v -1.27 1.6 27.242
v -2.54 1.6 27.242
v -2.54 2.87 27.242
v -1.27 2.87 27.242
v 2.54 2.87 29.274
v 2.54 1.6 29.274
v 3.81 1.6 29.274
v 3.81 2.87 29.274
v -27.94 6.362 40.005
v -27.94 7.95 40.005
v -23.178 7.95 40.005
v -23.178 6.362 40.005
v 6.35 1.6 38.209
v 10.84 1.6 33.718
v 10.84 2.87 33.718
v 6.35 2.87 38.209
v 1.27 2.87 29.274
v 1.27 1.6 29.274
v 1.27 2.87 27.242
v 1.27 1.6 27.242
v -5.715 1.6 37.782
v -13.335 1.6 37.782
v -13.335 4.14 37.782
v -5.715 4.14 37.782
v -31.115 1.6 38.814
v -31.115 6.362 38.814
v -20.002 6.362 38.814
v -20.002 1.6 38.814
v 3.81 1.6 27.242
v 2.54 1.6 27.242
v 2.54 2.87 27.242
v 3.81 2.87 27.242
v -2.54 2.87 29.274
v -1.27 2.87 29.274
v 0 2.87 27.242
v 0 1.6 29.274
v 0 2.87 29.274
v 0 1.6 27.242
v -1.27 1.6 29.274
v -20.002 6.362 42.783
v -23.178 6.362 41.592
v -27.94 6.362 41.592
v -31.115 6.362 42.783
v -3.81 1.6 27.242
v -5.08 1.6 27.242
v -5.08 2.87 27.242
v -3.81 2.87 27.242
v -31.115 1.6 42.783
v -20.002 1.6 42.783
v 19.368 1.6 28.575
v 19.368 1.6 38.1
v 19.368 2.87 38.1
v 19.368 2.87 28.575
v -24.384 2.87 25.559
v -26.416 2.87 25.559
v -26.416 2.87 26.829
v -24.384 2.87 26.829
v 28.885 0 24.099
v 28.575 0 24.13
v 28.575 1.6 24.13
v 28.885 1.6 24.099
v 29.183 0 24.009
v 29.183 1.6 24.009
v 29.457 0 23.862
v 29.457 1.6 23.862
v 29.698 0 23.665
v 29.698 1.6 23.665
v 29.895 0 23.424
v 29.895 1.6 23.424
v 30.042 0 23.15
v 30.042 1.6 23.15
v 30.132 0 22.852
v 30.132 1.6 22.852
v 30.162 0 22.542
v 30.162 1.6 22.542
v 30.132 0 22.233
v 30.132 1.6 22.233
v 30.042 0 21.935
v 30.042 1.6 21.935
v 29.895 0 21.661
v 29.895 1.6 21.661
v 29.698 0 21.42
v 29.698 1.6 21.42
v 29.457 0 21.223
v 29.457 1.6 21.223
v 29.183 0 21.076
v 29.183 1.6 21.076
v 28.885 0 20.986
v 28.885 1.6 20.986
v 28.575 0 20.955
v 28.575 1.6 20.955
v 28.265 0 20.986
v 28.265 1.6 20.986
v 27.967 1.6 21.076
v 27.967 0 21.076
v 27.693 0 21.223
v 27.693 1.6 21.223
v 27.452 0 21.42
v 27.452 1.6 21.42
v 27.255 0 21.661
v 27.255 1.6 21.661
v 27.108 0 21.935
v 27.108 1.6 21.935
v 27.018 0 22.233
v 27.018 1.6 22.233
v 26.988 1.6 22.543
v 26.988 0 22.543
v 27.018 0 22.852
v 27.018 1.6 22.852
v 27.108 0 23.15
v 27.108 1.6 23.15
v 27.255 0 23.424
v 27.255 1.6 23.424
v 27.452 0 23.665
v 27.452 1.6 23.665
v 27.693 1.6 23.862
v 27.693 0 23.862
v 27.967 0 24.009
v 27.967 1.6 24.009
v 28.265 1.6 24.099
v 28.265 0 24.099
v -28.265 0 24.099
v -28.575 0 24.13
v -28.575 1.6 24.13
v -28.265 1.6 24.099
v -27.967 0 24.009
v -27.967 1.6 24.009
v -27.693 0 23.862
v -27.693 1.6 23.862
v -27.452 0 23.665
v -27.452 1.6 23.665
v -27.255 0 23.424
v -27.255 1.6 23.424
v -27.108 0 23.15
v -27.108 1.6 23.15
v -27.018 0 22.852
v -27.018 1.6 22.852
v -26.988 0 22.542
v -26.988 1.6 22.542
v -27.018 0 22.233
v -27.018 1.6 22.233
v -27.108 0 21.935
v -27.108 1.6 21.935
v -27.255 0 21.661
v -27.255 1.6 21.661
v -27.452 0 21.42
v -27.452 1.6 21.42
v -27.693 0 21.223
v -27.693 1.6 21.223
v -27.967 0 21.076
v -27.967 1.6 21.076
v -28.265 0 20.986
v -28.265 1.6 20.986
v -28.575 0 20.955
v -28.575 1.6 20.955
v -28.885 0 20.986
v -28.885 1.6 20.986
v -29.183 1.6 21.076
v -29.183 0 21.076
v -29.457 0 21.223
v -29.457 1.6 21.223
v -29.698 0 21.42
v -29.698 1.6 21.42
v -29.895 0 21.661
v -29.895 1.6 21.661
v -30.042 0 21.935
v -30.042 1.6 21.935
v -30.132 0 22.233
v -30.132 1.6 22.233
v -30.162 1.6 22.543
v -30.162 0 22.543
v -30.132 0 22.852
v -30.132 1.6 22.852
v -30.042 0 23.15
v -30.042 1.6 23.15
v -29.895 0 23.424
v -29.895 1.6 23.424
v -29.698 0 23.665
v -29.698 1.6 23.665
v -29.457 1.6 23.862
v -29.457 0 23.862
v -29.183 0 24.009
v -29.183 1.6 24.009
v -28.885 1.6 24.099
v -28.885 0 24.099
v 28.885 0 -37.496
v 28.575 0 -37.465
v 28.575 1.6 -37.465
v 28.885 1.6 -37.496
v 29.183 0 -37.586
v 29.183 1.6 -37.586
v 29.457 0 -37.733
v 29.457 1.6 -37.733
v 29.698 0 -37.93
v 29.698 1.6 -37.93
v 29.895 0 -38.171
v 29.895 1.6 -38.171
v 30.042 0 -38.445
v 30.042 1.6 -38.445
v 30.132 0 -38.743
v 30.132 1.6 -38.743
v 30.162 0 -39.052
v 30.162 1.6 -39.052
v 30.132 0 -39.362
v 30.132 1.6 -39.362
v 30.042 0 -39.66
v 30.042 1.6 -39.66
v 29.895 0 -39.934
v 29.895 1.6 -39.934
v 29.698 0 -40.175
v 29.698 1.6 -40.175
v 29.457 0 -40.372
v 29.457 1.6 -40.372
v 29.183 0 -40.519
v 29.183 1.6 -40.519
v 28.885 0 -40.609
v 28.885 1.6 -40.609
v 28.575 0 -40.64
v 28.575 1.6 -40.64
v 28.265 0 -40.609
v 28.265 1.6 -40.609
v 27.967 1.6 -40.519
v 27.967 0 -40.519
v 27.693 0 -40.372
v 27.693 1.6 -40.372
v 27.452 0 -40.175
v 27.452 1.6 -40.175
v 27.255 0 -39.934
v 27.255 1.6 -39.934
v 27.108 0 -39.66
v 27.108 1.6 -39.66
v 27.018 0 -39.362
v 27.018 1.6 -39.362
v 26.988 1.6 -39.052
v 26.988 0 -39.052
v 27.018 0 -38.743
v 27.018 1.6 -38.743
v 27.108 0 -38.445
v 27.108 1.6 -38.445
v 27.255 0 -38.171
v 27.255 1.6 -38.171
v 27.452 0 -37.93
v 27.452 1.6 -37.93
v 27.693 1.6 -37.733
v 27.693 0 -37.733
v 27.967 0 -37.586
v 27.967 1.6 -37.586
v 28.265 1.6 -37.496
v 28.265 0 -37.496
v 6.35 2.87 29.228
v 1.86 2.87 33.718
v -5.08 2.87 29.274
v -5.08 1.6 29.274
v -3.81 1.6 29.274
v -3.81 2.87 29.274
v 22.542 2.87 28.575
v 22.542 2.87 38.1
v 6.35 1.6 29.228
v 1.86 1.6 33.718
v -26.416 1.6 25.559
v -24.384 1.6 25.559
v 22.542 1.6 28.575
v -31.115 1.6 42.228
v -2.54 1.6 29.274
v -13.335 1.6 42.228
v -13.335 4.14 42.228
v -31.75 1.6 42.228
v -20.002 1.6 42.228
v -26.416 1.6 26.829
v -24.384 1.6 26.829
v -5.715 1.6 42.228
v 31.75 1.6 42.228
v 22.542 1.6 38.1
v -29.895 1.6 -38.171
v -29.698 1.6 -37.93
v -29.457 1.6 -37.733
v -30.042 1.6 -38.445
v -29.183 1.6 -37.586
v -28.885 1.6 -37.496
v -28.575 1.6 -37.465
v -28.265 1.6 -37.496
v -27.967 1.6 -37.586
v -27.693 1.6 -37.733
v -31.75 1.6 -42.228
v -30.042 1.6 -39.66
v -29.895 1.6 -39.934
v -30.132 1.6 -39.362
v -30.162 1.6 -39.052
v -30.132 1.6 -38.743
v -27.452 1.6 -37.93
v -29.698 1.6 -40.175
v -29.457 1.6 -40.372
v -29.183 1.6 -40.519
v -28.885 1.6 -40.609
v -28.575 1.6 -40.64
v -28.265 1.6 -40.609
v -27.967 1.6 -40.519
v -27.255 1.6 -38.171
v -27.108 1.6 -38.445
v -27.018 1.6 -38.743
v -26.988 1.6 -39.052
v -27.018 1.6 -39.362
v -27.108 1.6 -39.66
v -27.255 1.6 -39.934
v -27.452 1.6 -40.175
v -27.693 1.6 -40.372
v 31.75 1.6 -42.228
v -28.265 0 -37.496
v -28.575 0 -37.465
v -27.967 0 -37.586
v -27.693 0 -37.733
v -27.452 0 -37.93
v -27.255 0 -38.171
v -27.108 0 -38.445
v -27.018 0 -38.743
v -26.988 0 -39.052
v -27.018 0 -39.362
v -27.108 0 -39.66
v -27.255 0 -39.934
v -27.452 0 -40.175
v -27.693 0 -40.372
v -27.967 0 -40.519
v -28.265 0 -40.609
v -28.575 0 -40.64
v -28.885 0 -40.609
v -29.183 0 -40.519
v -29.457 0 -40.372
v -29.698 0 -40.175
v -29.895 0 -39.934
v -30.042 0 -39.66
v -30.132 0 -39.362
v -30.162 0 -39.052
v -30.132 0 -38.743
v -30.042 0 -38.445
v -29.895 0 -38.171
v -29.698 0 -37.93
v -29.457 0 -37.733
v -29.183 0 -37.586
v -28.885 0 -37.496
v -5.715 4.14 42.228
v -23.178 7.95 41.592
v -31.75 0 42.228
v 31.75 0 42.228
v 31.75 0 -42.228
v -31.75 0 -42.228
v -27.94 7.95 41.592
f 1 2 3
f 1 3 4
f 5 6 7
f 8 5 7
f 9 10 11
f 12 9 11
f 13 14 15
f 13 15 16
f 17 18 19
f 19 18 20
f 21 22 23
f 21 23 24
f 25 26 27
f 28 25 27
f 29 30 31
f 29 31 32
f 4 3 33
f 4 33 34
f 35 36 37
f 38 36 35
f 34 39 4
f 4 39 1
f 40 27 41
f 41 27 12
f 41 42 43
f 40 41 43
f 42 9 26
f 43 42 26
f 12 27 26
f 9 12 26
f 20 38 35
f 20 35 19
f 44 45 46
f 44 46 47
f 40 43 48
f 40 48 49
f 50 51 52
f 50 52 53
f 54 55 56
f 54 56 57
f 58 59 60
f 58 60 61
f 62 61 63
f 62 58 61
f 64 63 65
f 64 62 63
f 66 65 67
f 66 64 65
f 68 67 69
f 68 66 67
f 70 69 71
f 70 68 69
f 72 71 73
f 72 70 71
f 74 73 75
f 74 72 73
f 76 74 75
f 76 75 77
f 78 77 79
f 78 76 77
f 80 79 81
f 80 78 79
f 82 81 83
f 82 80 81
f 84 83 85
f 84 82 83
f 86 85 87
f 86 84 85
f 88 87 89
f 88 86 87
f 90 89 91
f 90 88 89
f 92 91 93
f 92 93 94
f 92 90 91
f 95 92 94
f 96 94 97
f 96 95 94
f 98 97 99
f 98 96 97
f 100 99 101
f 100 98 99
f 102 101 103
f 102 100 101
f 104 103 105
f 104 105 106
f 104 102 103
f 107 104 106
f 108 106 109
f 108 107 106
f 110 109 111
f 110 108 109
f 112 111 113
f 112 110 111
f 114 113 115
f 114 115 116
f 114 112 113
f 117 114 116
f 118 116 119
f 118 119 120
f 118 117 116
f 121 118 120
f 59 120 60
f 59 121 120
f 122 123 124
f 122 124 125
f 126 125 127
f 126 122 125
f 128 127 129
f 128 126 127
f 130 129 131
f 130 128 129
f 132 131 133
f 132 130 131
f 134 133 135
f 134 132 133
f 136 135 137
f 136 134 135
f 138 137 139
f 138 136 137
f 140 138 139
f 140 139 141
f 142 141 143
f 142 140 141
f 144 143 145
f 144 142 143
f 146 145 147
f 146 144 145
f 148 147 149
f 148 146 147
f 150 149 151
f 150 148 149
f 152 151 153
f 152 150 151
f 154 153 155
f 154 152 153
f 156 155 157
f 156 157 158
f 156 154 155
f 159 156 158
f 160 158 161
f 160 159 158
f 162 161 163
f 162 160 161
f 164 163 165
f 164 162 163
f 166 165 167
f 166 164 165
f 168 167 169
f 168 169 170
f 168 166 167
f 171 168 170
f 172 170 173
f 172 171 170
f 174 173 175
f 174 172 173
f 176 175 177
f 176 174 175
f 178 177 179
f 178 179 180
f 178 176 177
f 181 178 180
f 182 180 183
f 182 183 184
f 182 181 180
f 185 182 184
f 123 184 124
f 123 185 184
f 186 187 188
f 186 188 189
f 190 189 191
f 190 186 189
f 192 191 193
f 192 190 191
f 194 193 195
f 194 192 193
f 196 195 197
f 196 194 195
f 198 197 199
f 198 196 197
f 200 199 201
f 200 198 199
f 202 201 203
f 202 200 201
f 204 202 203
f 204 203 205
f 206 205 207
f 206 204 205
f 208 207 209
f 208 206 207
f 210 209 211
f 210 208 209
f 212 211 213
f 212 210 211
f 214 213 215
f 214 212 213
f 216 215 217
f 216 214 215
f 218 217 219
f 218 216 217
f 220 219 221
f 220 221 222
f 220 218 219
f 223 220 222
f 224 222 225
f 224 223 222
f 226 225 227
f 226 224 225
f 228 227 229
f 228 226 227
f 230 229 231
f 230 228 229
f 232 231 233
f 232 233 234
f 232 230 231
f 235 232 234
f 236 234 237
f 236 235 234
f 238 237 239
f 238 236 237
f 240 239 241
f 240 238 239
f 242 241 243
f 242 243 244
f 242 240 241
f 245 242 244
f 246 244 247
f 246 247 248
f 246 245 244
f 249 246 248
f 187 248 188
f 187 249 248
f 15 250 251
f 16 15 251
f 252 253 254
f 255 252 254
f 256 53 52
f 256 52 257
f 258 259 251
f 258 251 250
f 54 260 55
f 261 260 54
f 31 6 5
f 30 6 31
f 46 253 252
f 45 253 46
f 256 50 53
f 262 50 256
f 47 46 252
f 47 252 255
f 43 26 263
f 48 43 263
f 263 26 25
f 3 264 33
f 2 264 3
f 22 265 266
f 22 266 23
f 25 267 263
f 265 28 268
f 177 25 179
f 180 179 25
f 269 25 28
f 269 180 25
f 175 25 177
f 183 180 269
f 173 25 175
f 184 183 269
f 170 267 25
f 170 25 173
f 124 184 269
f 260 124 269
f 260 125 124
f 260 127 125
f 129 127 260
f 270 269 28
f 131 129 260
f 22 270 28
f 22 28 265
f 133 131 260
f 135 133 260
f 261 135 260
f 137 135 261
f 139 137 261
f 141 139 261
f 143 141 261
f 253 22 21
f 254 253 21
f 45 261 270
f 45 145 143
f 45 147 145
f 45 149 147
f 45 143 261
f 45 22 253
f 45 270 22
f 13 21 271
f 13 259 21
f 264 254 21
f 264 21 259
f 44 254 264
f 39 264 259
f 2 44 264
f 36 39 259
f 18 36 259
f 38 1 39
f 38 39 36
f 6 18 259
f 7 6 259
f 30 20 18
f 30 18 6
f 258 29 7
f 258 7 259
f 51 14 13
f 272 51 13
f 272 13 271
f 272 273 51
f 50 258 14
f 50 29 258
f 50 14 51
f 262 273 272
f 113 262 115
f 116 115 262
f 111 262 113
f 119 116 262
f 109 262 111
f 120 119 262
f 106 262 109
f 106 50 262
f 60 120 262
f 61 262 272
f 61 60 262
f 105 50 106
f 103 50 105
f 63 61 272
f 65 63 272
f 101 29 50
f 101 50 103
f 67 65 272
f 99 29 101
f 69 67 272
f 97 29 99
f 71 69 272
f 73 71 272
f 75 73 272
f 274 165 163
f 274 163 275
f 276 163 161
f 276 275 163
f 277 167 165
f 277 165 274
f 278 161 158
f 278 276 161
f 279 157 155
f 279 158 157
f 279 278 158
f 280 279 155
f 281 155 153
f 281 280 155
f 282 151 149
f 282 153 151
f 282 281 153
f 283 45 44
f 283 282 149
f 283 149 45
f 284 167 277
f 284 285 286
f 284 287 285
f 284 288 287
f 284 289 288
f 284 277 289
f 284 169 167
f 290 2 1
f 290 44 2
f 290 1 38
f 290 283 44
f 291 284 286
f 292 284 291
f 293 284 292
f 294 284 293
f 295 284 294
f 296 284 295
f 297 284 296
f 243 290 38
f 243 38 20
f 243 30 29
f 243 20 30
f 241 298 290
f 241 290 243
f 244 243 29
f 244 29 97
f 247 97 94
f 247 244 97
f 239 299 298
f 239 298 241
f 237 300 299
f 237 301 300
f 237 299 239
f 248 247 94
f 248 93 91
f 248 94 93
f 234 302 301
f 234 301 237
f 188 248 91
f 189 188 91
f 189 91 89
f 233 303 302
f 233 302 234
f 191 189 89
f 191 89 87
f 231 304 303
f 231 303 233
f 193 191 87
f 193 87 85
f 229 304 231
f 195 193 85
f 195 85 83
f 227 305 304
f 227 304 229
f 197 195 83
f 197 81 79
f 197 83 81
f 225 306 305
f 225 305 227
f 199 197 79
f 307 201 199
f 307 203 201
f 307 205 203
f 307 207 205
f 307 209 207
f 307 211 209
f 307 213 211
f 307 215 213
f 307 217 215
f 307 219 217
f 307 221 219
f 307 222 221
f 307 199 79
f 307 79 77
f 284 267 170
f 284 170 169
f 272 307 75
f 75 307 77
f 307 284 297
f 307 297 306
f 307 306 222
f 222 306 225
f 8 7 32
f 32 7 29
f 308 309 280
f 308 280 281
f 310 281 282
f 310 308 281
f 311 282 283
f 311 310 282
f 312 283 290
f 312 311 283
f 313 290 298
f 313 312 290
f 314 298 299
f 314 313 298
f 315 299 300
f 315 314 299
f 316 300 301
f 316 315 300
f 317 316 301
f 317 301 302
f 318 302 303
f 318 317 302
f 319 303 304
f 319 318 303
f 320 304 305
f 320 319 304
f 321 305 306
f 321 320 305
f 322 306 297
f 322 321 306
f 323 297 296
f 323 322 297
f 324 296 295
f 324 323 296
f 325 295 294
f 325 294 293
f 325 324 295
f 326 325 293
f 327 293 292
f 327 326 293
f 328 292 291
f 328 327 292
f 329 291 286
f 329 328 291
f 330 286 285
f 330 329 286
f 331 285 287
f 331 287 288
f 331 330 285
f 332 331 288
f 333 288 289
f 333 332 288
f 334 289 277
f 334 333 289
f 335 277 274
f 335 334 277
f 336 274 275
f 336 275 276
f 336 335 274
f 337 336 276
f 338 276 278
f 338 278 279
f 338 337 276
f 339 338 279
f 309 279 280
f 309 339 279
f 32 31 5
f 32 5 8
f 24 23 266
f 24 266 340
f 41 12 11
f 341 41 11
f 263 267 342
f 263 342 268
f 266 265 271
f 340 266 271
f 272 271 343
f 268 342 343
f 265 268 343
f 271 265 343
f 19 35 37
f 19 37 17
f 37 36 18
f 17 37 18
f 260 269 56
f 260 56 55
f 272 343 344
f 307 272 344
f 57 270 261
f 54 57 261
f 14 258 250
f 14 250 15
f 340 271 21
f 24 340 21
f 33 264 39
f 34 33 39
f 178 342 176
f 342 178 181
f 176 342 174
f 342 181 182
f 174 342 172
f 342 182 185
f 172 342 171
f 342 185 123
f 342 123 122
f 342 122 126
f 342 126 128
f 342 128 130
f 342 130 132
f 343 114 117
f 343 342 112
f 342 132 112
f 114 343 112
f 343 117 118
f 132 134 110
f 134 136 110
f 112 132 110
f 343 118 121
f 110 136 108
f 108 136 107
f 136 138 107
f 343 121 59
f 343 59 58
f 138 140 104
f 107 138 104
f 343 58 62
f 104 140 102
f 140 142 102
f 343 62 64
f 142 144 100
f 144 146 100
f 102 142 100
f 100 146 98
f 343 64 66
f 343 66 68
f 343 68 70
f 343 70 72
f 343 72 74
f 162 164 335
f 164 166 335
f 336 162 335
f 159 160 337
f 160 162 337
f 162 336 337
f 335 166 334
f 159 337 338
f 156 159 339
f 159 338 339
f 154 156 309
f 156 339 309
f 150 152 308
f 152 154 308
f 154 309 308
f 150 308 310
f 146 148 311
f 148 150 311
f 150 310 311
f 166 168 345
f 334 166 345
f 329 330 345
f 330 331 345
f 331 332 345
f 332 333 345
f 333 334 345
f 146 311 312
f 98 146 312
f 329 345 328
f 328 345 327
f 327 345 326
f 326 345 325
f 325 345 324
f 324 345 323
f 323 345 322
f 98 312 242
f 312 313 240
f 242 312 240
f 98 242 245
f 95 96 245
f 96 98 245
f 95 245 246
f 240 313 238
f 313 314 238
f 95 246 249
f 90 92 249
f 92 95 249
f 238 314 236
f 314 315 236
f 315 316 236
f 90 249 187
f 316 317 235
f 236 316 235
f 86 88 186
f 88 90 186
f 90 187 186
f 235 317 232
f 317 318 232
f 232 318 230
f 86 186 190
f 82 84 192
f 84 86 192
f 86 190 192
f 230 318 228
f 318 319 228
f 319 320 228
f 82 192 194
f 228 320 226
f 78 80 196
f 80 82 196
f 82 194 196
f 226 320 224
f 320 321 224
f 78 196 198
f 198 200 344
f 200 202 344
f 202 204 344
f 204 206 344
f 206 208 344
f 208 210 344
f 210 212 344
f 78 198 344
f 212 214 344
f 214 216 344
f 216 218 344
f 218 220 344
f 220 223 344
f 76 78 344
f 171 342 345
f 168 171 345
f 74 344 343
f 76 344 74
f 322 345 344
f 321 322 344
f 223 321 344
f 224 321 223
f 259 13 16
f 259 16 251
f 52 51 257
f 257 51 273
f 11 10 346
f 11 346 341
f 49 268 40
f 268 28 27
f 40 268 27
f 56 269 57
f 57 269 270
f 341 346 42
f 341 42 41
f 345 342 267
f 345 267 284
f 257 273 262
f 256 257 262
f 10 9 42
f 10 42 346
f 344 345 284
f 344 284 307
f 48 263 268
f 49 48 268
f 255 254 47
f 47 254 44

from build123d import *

# Parameters (mm, degrees)
SKETCH1_W                = 63.5
SKETCH1_H                = 84.455
SKETCH1_R                = 1.5875
BOSS_EXTRUDE1_DEPTH      = 1.6
SKETCH2_W                = 1.27
SKETCH2_H                = 2.032
SKETCH2_W_2              = 3.175
SKETCH2_H_2              = 9.525
SKETCH2_W_3              = 2.032
SKETCH2_H_3              = 1.27
BOSS_EXTRUDE2_DEPTH      = 1.27
SKETCH3_W                = 7.62
SKETCH3_H                = 4.445
BOSS_EXTRUDE3_DEPTH      = 2.54
BOSS_EXTRUDE4_DEPTH      = 1.984375
BOSS_EXTRUDE4_DEPTH_BACK = 1.984375
BOSS_EXTRUDE4_START      = -1.42875
CUT_EXTRUDE1_REACH       = 94.284
CUT_EXTRUDE1_START       = -1.190625
SKETCH5_W                = 4.7625
SKETCH5_H                = 1.5875
CUT_EXTRUDE2_REACH       = 95.872
CUT_EXTRUDE2_START       = -2.778125
SKETCH5_2_W              = 4.7625
SKETCH5_2_H              = 1.5875


with BuildPart() as part:
    # Sketch1 → Boss-Extrude1 (new body)
    with BuildSketch(Plane(origin=(0, 0, 0), x_dir=(1, 0, 0), z_dir=(0, 1, 0))):
        Rectangle(SKETCH1_W, SKETCH1_H)
        with Locations((-28.575, 39.0525)):
            Circle(SKETCH1_R, mode=Mode.SUBTRACT)
        with Locations((28.575, 39.0525)):
            Circle(SKETCH1_R, mode=Mode.SUBTRACT)
        with Locations((-28.575, -22.5425)):
            Circle(SKETCH1_R, mode=Mode.SUBTRACT)
        with Locations((28.575, -22.5425)):
            Circle(SKETCH1_R, mode=Mode.SUBTRACT)
    extrude(amount=BOSS_EXTRUDE1_DEPTH)

    # Sketch2 → Boss-Extrude2 (add)
    with BuildSketch(Plane(origin=(0, 1.6, 0), x_dir=(1, 0, 0), z_dir=(0, 1, 0))):
        Polygon((6.35, -29.228371939), (10.840128061, -33.7185), (6.35, -38.208628061), (1.859871939, -33.7185), align=None)
        with Locations((-1.905, -28.2575)):
            Rectangle(SKETCH2_W, SKETCH2_H)
        with Locations((-4.445, -28.2575)):
            Rectangle(SKETCH2_W, SKETCH2_H)
        with Locations((0.635, -28.2575)):
            Rectangle(SKETCH2_W, SKETCH2_H)
        with Locations((3.175, -28.2575)):
            Rectangle(SKETCH2_W, SKETCH2_H)
        with Locations((20.955, -33.3375)):
            Rectangle(SKETCH2_W_2, SKETCH2_H_2)
        with Locations((-25.4, -26.19375)):
            Rectangle(SKETCH2_W_3, SKETCH2_H_3)
    extrude(amount=BOSS_EXTRUDE2_DEPTH)

    # Sketch3 → Boss-Extrude3 (add)
    with BuildSketch(Plane(origin=(0, 1.6, 0), x_dir=(1, 0, 0), z_dir=(0, 1, 0))):
        with Locations((-9.525, -40.005)):
            Rectangle(SKETCH3_W, SKETCH3_H)
    extrude(amount=BOSS_EXTRUDE3_DEPTH)

    # Sketch4 → Boss-Extrude4 (add, two sides: drawn at the far end of the back side and taken through both)
    with BuildSketch(Plane.XY.offset(42.2275).offset(BOSS_EXTRUDE4_START - BOSS_EXTRUDE4_DEPTH_BACK)):
        Polygon((-27.94, 6.3625), (-31.115, 6.3625), (-31.115, 1.6), (-20.0025, 1.6), (-20.0025, 6.3625), (-23.1775, 6.3625), (-23.1775, 7.95), (-27.94, 7.95), align=None)
    extrude(amount=BOSS_EXTRUDE4_DEPTH + BOSS_EXTRUDE4_DEPTH_BACK)

    # Sketch5 → Cut-Extrude1 (cut, up to next)
    with BuildSketch(Plane.XY.offset(42.783125).offset(CUT_EXTRUDE1_START), mode=Mode.PRIVATE) as cut_extrude1_sk1:
        with Locations((-25.55875, 7.15625)):
            Rectangle(SKETCH5_W, SKETCH5_H)
    cut_extrude1_tool1 = extrude(cut_extrude1_sk1.sketch, amount=CUT_EXTRUDE1_REACH, mode=Mode.PRIVATE) & part.part
    add(cut_extrude1_tool1.solids().sort_by_distance((-25.55875, 7.15625, 41.5925))[0], mode=Mode.SUBTRACT)

    # Sketch5<2> → Cut-Extrude2 (cut, up to next)
    with BuildSketch(Plane.XY.offset(42.783125).offset(CUT_EXTRUDE2_START), mode=Mode.PRIVATE) as cut_extrude2_sk1:
        with Locations((-25.55875, 7.15625)):
            Rectangle(SKETCH5_2_W, SKETCH5_2_H)
    cut_extrude2_tool1 = extrude(cut_extrude2_sk1.sketch, amount=-CUT_EXTRUDE2_REACH, mode=Mode.PRIVATE) & part.part
    add(cut_extrude2_tool1.solids().sort_by_distance((-25.55875, 7.15625, 40.005))[0], mode=Mode.SUBTRACT)


solid = part.part
